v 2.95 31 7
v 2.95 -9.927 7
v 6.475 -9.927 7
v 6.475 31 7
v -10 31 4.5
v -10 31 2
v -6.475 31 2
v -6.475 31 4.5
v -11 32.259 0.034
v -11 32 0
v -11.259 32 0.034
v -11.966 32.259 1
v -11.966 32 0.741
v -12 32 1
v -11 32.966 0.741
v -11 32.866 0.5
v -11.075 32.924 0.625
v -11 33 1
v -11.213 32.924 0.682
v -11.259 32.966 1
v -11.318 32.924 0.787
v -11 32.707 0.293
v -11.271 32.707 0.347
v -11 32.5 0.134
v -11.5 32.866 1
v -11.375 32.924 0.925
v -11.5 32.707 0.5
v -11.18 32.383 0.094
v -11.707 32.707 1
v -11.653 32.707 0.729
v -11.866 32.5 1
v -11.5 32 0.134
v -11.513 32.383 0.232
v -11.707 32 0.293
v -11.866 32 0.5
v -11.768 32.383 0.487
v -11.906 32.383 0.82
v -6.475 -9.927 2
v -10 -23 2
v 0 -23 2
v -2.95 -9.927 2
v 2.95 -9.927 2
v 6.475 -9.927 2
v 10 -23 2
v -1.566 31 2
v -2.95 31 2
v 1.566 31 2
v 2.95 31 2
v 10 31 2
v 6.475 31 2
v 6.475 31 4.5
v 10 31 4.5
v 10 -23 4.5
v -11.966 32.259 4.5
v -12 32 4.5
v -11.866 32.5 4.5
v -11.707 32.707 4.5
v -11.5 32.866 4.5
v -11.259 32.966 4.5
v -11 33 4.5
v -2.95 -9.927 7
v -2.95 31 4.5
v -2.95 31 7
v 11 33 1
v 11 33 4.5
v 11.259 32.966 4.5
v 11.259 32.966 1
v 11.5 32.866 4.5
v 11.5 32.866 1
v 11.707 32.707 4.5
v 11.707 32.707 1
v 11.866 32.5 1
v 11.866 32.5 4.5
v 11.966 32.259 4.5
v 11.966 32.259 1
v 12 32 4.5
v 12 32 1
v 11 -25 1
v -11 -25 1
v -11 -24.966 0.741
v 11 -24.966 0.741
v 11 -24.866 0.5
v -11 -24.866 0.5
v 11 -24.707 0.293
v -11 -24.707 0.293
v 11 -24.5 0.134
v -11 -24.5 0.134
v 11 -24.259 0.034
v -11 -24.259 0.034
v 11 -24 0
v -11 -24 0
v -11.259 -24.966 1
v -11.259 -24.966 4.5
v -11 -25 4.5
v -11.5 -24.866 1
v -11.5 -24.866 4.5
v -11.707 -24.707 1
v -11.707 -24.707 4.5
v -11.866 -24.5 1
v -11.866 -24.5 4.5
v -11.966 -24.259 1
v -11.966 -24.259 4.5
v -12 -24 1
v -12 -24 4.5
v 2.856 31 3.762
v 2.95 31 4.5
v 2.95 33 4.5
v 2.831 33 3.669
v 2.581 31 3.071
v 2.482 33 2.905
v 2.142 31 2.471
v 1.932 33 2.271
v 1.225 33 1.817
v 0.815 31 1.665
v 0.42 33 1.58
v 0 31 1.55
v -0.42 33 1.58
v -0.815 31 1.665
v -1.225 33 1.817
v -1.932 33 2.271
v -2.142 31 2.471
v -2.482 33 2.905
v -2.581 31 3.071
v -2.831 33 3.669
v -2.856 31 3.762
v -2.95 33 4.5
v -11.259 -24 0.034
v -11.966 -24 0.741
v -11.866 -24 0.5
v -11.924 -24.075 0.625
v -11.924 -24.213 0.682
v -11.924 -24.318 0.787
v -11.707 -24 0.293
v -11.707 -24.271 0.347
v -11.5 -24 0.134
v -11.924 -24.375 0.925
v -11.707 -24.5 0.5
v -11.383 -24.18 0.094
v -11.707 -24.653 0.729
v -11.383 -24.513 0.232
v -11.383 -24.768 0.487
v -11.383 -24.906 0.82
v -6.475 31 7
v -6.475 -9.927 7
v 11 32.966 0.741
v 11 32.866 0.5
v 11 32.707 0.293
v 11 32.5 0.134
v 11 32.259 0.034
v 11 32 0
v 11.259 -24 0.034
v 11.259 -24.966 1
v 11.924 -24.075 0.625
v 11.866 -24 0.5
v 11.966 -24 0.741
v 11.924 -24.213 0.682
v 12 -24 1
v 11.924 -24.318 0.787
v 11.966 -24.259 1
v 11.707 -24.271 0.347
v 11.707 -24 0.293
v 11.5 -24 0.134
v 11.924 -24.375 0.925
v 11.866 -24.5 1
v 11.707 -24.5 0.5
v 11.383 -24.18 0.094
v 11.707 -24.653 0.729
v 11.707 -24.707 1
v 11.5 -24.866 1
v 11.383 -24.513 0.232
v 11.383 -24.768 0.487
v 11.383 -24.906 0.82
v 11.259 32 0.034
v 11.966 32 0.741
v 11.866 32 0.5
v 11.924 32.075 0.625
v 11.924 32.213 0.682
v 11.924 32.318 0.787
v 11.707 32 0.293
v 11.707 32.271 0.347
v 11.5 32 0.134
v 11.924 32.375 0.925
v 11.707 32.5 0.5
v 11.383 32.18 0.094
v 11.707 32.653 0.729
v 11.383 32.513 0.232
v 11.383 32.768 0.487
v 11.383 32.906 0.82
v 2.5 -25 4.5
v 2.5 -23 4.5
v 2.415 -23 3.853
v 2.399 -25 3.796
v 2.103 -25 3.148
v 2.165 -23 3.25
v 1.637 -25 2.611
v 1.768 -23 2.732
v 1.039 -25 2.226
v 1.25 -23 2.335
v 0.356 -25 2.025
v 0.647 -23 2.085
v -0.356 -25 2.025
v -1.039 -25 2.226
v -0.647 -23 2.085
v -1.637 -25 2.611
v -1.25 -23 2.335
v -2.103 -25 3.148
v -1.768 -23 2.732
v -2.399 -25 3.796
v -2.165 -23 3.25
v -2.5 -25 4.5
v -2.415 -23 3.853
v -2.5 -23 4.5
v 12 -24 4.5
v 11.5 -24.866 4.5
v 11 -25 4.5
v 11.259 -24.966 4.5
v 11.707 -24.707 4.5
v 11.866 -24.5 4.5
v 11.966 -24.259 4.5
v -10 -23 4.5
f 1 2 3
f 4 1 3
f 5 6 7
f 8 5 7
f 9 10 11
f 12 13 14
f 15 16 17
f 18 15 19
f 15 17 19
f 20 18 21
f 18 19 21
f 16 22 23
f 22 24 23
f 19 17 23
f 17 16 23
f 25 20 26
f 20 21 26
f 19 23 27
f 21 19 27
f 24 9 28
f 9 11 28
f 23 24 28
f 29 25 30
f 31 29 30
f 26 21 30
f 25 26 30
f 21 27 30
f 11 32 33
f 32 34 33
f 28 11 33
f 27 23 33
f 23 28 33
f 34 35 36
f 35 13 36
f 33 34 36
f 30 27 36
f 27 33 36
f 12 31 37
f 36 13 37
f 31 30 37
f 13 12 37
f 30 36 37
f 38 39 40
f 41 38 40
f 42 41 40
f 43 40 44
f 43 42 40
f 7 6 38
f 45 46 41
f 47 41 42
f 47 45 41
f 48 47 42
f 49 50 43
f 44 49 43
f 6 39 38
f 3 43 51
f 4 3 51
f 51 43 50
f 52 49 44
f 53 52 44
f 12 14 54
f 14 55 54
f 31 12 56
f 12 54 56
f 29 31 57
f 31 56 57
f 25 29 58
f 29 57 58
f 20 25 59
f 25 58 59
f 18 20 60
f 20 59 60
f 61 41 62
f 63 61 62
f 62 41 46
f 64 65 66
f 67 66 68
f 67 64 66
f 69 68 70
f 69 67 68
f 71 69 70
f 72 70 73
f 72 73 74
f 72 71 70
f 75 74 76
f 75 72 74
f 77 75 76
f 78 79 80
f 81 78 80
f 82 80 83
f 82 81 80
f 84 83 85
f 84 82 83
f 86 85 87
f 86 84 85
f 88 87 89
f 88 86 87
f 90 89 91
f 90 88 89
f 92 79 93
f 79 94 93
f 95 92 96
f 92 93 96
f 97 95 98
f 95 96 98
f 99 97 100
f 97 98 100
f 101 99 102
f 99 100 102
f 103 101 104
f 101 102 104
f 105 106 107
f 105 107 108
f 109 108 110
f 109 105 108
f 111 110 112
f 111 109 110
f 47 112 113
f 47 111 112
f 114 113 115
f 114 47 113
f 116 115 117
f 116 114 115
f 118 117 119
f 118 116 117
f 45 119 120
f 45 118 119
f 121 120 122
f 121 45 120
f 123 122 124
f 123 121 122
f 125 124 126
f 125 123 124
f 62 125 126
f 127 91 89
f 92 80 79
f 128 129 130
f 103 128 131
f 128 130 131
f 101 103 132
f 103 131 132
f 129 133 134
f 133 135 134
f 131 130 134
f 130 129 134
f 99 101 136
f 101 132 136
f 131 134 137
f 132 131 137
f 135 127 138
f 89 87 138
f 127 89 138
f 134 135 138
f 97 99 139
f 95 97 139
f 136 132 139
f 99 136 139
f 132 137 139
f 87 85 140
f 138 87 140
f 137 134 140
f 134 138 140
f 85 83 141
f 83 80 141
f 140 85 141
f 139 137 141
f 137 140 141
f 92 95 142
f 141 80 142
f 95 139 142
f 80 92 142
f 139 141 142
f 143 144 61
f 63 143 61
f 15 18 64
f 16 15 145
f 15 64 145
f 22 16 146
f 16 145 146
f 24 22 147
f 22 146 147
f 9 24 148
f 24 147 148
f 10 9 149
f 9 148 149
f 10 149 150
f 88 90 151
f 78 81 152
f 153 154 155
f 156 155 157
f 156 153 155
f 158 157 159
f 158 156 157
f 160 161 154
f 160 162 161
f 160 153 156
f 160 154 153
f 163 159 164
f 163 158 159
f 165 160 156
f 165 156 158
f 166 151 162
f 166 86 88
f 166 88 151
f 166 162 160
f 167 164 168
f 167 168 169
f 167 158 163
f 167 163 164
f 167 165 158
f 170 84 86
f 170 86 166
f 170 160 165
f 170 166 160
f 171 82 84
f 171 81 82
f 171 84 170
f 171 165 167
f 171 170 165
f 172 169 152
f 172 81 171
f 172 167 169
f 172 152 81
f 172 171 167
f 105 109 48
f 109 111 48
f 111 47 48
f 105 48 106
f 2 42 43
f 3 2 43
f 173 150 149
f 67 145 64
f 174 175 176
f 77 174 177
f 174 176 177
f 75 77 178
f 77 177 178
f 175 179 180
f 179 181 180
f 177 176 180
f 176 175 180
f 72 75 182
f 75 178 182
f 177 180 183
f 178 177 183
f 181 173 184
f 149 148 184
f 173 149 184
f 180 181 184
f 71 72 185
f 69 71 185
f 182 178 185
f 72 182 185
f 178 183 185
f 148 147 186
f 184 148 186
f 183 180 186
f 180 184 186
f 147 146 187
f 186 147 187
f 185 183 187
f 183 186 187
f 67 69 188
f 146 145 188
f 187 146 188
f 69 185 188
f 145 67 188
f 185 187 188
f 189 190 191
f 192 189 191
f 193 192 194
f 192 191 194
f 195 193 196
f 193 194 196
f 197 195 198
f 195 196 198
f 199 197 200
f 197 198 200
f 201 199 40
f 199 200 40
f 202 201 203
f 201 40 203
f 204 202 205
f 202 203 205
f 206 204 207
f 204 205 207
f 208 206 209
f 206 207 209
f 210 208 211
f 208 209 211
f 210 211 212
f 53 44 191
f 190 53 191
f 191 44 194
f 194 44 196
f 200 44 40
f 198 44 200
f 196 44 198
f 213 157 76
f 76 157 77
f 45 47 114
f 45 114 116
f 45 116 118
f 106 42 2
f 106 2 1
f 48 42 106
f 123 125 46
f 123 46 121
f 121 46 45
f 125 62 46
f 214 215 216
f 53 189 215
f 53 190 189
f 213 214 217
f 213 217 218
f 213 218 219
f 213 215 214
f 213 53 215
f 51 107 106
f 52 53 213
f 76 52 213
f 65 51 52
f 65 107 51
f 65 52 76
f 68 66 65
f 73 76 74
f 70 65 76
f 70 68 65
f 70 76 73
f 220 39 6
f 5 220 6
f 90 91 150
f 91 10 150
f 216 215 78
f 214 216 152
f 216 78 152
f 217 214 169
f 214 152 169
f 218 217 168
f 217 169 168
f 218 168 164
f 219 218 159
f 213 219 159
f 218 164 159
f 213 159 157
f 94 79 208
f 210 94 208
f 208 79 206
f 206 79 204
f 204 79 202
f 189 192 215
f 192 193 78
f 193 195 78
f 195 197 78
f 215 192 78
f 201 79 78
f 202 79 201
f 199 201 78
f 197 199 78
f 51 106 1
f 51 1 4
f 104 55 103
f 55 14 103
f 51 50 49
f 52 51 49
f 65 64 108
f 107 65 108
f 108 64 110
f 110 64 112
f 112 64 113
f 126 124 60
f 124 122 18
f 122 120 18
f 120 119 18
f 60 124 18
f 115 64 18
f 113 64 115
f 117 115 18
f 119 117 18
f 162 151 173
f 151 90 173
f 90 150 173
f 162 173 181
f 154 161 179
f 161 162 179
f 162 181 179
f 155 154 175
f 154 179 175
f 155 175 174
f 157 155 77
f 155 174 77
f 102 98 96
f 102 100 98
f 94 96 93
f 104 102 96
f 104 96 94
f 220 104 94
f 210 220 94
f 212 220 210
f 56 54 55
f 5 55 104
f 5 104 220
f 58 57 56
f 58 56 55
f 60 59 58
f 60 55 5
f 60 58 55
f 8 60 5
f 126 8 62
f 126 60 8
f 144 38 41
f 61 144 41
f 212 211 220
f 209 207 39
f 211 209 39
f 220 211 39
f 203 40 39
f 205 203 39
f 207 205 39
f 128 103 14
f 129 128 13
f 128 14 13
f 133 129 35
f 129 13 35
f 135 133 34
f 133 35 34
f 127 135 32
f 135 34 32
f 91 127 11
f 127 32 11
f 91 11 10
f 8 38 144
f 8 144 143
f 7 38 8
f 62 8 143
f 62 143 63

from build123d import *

# Parameters (mm, degrees)
SKETCH1_W           = 24
SKETCH1_H           = 58
BOSS_EXTRUDE1_DEPTH = 2
BOSS_EXTRUDE2_DEPTH = 2.5
CUT_EXTRUDE3_DEPTH  = 3
CUT_EXTRUDE4_DEPTH  = 3
SKETCH7_W           = 3.525
SKETCH7_H           = 40.926519782
BOSS_EXTRUDE3_DEPTH = 5
FILLET1_R           = 1


with BuildPart() as part:
    # Sketch1 → Boss-Extrude1 (new body)
    with BuildSketch(Plane.XY):
        with Locations((0, 4)):
            Rectangle(SKETCH1_W, SKETCH1_H)
    extrude(amount=BOSS_EXTRUDE1_DEPTH)

    # Sketch2 → Boss-Extrude2 (add)
    with BuildSketch(Plane.XY.offset(2)):
        Polygon((12, 33), (-12, 33), (-12, -25), (12, -25), (12, 9), align=None)
        Polygon((-10, -23), (-10, 23), (-10, 31), (10, 31), (10, 23), (10, -23), align=None, mode=Mode.SUBTRACT)
    extrude(amount=BOSS_EXTRUDE2_DEPTH)

    # Sketch5 → Cut-Extrude3 (cut, through all)
    with BuildSketch(Plane.XZ.offset(-31)):
        with BuildLine():
            Line((-2.95, 4.5), (2.95, 4.5))
            ThreePointArc((2.95, 4.5), (0, 1.55), (-2.95, 4.5))
        make_face()
    extrude(amount=-CUT_EXTRUDE3_DEPTH, mode=Mode.SUBTRACT)

    # Sketch6 → Cut-Extrude4 (cut, through all)
    with BuildSketch(Plane(origin=(0, -23, 0), x_dir=(1, 0, 0), z_dir=(0, 1, 0))):
        with BuildLine():
            Line((-2.5, -4.5), (2.5, -4.5))
            ThreePointArc((2.5, -4.5), (0, -2), (-2.5, -4.5))
        make_face()
    extrude(amount=-CUT_EXTRUDE4_DEPTH, mode=Mode.SUBTRACT)

    # Sketch7 → Boss-Extrude3 (add)
    with BuildSketch(Plane.XY.offset(2)):
        with Locations((-4.7125, 10.536740109)):
            Rectangle(SKETCH7_W, SKETCH7_H)
        with Locations((4.7125, 10.536740109)):
            Rectangle(SKETCH7_W, SKETCH7_H)
    extrude(amount=BOSS_EXTRUDE3_DEPTH)

    # Fillet1
    fillet1_edges = [part.edges().sort_by_distance(p)[0] for p in [
        (0, -25, 0),
        (-12, 4, 0),
        (0, 33, 0),
        (12, 4, 0),
        (12, -25, 2.25),
        (-12, -25, 2.25),
        (-12, 33, 2.25),
        (12, 33, 2.25),
    ]]
    fillet(fillet1_edges, radius=FILLET1_R)


solid = part.part
